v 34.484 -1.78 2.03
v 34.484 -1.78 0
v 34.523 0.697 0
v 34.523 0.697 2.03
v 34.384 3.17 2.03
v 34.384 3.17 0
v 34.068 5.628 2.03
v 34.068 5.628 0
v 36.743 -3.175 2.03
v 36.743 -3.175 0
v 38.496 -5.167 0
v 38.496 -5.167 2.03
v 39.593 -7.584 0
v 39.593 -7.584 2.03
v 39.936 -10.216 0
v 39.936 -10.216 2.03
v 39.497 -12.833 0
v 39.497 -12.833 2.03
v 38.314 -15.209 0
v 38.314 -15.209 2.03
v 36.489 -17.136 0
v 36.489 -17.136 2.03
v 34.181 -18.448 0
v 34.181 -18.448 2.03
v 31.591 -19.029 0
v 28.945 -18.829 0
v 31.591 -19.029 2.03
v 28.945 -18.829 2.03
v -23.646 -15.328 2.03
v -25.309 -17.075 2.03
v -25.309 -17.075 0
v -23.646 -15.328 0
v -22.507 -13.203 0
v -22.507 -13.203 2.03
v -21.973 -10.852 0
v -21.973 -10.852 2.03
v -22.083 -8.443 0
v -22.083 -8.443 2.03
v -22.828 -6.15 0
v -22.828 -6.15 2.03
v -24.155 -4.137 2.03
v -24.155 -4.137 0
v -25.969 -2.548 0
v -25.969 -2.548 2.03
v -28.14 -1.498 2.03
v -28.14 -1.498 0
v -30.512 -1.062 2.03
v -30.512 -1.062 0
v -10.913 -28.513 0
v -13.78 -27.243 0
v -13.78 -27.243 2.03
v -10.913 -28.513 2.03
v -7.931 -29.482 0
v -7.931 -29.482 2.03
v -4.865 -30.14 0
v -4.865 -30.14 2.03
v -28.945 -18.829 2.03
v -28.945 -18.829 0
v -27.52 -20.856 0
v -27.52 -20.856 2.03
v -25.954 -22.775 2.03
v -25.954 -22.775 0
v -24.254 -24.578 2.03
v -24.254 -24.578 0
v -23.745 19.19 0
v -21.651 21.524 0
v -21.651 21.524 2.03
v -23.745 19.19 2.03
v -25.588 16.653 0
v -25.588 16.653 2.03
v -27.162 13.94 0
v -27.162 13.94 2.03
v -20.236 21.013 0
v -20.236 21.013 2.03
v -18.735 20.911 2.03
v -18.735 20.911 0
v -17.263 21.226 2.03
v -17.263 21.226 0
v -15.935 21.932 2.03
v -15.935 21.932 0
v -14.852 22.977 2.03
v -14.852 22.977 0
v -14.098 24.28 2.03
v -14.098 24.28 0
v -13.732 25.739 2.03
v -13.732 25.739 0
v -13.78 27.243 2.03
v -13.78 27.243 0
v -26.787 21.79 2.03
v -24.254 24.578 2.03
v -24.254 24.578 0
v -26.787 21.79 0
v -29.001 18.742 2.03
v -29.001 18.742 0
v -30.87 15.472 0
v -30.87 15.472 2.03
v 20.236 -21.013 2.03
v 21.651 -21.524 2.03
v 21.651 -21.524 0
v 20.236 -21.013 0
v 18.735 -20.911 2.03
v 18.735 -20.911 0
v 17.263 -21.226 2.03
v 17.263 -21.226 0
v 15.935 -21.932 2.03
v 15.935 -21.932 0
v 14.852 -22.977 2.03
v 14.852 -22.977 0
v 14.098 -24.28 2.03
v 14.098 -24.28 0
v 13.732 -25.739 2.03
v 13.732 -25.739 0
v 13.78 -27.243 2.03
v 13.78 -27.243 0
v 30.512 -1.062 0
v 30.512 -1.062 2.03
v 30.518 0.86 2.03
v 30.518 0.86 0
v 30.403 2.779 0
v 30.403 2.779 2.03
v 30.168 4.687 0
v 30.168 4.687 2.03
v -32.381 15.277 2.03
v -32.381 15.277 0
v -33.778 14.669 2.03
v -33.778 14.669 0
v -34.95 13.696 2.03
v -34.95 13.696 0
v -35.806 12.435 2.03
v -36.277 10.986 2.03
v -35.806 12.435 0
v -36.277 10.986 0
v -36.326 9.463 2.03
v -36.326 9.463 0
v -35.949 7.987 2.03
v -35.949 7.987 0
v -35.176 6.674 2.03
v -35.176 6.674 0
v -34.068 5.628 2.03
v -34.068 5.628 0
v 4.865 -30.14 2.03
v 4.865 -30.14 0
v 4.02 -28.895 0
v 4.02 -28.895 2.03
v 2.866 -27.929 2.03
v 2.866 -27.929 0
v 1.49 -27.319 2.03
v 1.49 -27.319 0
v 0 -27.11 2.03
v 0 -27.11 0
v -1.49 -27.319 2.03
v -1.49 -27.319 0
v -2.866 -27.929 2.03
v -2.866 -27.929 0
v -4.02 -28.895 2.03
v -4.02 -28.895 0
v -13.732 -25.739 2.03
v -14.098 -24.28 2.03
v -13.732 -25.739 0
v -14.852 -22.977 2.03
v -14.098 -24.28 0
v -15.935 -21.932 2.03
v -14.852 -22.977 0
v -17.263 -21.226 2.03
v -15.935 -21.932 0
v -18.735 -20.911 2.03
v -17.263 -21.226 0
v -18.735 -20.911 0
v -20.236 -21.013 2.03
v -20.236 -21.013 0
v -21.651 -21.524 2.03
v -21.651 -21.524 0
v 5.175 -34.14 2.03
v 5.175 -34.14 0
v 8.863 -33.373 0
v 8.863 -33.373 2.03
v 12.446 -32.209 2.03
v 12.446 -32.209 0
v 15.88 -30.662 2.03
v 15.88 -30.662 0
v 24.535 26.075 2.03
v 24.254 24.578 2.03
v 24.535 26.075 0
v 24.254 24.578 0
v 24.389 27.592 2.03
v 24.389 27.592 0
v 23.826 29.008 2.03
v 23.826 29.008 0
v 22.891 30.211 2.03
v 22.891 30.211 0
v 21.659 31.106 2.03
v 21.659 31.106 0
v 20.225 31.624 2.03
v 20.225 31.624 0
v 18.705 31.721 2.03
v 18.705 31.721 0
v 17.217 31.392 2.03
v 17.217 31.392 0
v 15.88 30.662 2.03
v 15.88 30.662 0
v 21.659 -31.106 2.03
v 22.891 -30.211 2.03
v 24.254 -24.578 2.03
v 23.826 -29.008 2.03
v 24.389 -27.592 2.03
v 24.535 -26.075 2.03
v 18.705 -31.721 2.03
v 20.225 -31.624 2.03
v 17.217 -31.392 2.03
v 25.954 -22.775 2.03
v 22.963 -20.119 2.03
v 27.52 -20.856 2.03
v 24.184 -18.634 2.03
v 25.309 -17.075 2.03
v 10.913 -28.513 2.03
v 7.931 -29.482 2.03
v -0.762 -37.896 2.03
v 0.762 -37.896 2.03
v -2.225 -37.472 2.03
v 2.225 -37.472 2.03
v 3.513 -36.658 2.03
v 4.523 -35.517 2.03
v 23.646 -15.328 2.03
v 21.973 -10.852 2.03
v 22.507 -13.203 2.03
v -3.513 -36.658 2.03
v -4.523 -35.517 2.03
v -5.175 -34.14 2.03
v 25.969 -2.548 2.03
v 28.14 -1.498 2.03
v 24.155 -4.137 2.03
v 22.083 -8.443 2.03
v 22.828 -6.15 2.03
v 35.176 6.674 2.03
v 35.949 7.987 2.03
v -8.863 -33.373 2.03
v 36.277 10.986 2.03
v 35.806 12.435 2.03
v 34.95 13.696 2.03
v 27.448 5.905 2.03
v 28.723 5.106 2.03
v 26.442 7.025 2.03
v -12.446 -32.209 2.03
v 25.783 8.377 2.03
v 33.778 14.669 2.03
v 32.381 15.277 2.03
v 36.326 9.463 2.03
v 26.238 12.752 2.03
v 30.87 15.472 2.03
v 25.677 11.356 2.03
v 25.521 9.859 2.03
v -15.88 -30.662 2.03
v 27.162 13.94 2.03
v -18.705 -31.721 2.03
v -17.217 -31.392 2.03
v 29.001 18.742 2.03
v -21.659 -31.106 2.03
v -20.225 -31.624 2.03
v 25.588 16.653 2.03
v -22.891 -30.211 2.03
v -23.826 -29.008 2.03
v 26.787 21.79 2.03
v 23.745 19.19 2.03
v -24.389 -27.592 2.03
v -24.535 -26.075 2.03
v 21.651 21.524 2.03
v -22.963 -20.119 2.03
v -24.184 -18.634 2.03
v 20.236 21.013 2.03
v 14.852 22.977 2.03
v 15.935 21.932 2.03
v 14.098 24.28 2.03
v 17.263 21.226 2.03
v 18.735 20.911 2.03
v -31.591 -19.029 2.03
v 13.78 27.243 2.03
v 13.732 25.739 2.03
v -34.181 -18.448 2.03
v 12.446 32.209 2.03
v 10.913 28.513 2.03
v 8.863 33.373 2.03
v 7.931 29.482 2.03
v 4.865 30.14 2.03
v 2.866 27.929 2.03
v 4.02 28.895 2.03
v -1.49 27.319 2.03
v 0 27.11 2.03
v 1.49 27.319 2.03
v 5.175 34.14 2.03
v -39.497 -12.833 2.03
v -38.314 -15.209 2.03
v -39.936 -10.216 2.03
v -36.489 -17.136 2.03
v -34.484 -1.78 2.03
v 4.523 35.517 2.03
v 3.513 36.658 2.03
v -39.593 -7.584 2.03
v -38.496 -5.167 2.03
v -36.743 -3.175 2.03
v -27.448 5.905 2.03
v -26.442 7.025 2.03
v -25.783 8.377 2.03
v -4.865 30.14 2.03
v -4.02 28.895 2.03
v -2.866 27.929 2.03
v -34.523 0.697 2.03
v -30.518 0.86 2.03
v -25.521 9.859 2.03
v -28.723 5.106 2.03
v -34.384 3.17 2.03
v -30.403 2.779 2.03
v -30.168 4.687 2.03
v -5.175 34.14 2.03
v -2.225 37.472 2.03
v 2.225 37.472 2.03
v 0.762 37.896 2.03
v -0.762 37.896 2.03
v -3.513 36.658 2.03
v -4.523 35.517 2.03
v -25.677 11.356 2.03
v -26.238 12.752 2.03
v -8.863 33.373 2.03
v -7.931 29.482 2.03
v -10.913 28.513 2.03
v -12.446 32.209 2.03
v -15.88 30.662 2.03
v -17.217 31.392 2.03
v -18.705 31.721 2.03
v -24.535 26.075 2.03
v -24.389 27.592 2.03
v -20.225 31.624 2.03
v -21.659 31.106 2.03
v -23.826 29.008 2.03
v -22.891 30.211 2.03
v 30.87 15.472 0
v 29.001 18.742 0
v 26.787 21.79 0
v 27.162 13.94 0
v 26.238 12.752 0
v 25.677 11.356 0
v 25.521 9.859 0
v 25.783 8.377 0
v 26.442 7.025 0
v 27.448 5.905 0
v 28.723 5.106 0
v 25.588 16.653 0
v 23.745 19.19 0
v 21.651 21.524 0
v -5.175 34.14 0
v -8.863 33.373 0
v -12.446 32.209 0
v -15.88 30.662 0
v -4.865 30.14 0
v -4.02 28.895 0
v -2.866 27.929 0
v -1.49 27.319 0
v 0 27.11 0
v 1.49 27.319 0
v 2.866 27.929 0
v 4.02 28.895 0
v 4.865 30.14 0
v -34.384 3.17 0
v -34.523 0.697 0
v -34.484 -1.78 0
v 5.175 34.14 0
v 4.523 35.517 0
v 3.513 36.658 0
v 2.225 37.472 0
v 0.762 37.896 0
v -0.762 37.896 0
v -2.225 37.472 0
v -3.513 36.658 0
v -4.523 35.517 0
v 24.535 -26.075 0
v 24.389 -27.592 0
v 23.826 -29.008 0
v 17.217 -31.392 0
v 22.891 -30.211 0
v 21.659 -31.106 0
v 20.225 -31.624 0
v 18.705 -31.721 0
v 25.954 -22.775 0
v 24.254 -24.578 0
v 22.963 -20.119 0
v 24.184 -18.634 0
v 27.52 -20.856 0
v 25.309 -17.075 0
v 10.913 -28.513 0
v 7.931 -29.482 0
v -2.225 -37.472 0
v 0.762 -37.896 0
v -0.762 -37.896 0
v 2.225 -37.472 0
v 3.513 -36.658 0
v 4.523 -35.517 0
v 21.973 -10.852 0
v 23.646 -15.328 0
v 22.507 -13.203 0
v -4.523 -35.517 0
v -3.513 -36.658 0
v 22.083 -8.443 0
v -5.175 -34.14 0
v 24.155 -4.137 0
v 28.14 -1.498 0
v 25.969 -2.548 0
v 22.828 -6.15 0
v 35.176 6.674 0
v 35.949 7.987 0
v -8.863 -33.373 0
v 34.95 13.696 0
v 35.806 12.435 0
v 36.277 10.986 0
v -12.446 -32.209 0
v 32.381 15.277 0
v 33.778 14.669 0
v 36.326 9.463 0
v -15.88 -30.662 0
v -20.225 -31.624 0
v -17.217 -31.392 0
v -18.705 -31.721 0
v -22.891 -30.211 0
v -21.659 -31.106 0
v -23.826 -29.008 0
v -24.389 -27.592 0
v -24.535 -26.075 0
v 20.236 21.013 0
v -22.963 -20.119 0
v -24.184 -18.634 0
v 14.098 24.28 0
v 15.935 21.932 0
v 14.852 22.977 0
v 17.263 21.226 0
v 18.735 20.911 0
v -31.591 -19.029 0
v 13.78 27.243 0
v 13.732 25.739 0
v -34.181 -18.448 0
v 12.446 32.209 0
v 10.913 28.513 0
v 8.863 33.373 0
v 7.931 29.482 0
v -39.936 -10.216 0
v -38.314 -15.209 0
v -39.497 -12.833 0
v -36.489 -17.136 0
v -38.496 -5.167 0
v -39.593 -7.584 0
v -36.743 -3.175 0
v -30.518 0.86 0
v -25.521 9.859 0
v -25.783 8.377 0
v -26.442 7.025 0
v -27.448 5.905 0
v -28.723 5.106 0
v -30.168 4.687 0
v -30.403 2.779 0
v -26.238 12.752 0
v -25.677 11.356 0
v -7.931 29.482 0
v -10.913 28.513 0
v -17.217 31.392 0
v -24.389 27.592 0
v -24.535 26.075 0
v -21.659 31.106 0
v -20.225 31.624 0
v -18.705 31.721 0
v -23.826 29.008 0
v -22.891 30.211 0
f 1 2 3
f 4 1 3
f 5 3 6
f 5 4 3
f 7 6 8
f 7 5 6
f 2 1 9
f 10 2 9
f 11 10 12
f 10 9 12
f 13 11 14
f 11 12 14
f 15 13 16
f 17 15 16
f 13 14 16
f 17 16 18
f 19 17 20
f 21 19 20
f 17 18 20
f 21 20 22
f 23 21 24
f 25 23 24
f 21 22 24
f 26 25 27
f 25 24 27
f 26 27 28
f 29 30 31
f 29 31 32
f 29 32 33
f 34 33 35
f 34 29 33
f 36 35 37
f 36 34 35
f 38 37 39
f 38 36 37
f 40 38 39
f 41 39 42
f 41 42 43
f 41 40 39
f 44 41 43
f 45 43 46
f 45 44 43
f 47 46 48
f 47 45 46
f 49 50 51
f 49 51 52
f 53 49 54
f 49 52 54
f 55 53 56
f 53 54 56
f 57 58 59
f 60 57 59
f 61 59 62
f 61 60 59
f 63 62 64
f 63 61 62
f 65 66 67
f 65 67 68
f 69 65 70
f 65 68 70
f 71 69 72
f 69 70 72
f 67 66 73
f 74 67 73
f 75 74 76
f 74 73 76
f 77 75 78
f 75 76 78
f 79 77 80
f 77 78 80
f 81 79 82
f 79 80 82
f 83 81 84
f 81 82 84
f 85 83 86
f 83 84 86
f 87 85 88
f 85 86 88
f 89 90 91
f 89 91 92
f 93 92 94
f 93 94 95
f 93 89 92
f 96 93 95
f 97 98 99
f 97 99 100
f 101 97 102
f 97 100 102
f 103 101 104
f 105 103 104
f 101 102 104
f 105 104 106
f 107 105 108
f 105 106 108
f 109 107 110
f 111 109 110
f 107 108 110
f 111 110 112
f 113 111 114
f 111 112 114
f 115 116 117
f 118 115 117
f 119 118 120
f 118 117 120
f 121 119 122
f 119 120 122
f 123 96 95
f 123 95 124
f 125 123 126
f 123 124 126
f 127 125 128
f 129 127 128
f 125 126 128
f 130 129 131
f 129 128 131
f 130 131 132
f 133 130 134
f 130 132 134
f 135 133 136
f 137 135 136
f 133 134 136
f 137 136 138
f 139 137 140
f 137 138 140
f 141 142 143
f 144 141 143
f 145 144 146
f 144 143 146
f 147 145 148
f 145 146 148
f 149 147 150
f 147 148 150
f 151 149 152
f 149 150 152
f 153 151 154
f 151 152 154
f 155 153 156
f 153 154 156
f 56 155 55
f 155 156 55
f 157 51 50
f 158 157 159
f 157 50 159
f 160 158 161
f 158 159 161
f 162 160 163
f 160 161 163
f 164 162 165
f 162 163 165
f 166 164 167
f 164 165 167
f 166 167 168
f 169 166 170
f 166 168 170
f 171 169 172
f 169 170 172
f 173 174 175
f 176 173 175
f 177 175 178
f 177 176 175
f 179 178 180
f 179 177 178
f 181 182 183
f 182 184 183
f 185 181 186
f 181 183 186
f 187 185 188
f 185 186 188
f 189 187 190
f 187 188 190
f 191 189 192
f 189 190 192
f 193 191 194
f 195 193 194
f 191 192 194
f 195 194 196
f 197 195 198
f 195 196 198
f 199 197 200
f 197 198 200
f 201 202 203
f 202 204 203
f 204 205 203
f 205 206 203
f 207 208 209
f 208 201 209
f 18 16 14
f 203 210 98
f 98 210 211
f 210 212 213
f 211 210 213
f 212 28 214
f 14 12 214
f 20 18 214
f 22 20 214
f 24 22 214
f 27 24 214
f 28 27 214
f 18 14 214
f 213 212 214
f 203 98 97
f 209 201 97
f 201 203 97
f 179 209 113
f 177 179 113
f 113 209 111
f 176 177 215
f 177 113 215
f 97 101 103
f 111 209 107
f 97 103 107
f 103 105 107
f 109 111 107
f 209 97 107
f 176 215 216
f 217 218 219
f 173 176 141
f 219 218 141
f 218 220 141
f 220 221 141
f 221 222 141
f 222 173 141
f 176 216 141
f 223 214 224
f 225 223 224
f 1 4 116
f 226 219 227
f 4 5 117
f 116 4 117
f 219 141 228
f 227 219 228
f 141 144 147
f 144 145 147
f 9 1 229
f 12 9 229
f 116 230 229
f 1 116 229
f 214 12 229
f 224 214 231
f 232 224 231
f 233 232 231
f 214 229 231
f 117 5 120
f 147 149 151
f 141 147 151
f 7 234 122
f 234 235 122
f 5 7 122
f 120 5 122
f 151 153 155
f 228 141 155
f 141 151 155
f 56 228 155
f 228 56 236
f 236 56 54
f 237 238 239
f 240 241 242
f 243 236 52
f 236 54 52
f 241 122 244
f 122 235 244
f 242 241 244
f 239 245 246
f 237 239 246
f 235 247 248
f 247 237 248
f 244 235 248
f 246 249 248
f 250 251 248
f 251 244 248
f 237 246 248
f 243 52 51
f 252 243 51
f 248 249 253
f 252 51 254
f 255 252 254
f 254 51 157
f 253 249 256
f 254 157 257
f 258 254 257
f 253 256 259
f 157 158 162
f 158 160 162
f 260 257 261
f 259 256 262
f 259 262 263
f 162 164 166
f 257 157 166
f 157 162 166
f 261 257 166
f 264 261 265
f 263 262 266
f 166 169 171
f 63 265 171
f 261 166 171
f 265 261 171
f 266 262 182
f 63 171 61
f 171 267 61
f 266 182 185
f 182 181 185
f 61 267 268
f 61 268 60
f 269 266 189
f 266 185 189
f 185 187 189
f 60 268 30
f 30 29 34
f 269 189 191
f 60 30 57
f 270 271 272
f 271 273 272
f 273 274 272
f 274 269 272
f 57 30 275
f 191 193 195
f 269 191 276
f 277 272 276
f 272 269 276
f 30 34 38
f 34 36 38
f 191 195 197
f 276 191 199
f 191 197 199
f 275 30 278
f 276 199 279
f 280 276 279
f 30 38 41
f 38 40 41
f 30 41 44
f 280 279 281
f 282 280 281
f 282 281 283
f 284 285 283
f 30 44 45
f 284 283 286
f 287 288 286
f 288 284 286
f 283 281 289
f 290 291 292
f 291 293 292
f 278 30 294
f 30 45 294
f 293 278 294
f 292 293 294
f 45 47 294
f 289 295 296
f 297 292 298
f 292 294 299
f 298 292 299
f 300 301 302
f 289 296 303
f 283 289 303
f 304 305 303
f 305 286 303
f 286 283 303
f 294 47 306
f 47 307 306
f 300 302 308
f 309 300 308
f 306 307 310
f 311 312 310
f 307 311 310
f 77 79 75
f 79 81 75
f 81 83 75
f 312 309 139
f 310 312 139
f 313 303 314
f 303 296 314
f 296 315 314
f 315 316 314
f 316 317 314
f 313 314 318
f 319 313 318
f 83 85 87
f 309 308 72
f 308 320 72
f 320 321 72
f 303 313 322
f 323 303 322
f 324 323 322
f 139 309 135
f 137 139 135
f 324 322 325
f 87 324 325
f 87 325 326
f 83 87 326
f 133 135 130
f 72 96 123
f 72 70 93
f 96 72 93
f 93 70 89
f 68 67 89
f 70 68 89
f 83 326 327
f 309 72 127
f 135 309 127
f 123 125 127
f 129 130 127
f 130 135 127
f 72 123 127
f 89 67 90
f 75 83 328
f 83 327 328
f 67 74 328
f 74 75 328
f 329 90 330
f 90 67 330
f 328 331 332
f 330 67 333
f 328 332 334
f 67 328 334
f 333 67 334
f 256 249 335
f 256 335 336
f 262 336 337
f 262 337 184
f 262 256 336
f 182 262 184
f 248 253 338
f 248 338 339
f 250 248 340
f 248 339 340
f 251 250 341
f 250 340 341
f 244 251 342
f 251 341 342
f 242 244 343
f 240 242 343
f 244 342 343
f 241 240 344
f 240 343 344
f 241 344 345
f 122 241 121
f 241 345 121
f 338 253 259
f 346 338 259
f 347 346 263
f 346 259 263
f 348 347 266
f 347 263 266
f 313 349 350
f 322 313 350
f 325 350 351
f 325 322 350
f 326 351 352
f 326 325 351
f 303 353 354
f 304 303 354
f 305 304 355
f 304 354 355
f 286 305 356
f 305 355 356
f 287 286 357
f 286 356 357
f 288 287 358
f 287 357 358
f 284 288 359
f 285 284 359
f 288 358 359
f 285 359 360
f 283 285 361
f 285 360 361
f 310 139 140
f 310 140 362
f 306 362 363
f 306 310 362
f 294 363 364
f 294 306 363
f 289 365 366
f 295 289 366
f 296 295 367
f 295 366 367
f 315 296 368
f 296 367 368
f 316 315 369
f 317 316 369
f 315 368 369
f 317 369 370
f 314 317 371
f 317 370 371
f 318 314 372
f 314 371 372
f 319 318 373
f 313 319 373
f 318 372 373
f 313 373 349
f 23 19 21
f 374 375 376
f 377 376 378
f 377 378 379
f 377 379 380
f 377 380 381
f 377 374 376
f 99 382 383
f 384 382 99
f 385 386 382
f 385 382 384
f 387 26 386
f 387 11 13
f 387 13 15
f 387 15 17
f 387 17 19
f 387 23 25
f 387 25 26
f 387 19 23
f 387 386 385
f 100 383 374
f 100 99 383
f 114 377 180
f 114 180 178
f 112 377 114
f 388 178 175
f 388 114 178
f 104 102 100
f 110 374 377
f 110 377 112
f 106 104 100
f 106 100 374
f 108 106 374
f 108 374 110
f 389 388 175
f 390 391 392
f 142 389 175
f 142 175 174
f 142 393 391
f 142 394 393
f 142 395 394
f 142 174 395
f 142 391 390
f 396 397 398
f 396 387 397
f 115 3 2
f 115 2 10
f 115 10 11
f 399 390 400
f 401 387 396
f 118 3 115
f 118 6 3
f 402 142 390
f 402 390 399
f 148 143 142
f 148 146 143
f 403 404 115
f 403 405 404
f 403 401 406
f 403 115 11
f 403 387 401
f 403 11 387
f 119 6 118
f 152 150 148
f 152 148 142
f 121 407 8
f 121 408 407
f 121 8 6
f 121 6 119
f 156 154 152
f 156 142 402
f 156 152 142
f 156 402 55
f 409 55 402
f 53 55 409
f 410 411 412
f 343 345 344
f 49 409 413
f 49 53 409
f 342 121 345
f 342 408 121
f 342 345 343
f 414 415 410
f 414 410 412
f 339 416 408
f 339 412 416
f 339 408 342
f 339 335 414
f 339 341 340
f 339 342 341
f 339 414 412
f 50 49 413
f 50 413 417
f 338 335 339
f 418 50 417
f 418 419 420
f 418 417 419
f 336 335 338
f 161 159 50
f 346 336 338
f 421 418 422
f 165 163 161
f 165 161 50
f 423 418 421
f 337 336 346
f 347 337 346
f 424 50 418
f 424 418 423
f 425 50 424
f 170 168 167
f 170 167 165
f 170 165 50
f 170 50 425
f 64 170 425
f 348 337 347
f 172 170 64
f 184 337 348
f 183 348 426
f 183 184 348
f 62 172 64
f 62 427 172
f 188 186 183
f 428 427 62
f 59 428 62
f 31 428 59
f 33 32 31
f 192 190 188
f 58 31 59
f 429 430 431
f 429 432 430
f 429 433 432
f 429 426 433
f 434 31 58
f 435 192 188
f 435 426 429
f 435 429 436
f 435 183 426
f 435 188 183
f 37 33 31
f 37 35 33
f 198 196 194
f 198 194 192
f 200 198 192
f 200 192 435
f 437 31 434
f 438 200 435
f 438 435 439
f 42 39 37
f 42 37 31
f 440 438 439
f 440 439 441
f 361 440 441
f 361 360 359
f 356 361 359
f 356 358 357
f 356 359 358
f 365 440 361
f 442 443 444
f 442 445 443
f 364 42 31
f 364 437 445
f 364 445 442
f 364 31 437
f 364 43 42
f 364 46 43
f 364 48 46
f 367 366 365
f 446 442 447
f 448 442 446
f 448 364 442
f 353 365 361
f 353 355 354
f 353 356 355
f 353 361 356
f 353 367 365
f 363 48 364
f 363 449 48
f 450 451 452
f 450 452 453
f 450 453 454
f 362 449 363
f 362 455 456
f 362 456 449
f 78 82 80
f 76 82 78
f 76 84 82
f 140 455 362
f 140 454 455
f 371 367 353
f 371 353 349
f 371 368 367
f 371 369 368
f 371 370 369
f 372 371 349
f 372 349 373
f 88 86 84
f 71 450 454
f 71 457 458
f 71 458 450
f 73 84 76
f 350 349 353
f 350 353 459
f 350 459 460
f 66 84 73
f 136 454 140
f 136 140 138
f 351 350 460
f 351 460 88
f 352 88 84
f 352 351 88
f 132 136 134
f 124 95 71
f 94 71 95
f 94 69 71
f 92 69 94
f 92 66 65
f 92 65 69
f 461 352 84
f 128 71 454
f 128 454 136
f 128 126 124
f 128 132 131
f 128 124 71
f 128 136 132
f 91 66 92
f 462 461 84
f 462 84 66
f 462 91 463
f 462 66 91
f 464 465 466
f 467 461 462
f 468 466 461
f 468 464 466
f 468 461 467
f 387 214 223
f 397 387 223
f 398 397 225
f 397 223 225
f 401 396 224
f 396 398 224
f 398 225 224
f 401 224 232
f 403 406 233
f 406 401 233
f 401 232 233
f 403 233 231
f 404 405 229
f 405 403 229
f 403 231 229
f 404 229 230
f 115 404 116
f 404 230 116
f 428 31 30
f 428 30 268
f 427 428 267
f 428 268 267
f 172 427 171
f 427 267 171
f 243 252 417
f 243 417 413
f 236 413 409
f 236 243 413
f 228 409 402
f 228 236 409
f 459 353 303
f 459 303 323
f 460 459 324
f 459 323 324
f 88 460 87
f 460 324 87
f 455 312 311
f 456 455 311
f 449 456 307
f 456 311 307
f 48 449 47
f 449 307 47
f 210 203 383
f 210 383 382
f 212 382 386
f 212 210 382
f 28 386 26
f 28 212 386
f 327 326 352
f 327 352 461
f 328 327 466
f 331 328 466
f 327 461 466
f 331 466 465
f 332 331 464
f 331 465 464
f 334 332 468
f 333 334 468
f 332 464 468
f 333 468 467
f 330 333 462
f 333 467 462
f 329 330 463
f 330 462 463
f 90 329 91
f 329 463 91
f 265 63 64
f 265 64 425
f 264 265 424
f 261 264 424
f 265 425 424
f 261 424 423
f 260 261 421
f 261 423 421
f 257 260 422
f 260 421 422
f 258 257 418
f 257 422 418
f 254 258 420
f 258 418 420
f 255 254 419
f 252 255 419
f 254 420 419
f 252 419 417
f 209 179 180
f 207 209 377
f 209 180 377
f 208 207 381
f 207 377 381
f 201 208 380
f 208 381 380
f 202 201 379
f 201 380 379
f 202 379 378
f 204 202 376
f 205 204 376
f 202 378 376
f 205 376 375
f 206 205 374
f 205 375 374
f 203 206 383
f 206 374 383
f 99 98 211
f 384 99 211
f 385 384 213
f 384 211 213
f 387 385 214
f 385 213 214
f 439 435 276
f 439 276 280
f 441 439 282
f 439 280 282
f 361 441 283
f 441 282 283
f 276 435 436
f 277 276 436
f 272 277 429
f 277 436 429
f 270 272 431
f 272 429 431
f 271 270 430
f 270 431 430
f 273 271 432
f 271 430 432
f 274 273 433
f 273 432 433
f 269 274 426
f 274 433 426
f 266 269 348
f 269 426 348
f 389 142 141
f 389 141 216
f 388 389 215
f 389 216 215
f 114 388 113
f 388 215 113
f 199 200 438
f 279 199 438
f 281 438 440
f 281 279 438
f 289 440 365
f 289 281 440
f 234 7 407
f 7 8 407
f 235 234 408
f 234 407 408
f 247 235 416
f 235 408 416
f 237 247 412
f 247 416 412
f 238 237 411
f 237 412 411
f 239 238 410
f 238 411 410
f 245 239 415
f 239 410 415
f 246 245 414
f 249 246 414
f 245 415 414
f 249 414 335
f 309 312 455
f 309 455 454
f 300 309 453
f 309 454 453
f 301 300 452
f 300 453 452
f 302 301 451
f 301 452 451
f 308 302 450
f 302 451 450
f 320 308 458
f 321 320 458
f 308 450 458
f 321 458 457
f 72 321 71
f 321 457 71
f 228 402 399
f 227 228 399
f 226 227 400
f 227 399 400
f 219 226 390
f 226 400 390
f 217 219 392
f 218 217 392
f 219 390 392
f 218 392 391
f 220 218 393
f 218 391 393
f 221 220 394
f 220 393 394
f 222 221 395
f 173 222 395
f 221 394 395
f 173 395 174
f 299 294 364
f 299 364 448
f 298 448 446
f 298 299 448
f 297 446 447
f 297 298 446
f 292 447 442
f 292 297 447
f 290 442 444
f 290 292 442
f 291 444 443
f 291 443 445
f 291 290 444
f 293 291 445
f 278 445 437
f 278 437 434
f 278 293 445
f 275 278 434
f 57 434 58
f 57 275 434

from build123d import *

# Parameters (mm, degrees)
SKETCH1_R              = 5.42
BOSS_EXTRUDE1_DEPTH    = 2.03
BOSS_EXTRUDE1_2_DEPTH  = 2.03
BOSS_EXTRUDE1_3_DEPTH  = 2.03
BOSS_EXTRUDE1_4_DEPTH  = 2.03
BOSS_EXTRUDE1_5_DEPTH  = 2.03
BOSS_EXTRUDE1_6_DEPTH  = 2.03
BOSS_EXTRUDE1_7_DEPTH  = 2.03
BOSS_EXTRUDE1_8_DEPTH  = 2.03
BOSS_EXTRUDE1_9_DEPTH  = 2.03
BOSS_EXTRUDE1_10_DEPTH = 2.03
SKETCH2_R              = 34.53
SKETCH2_R_2            = 30.53
BOSS_EXTRUDE2_DEPTH    = 2.03
SKETCH3_R              = 9
BOSS_EXTRUDE3_DEPTH    = 2.03


with BuildPart() as part:
    # Sketch1 → Boss-Extrude1 (new body)
    with BuildSketch(Plane.XY):
        with Locations((0, -32.53)):
            Circle(SKETCH1_R)
    extrude(amount=BOSS_EXTRUDE1_DEPTH)



with BuildPart() as body_2:
    # Sketch1 → Boss-Extrude1 2 (new body)
    with BuildSketch(Plane.XY):
        with Locations((-19.120654257, -26.317322827)):
            Circle(SKETCH1_R)
    extrude(amount=BOSS_EXTRUDE1_2_DEPTH)


with BuildPart() as body_3:
    # Sketch1 → Boss-Extrude1 3 (new body)
    with BuildSketch(Plane.XY):
        with Locations((-30.937868475, -10.052322827)):
            Circle(SKETCH1_R)
    extrude(amount=BOSS_EXTRUDE1_3_DEPTH)


with BuildPart() as body_4:
    # Sketch1 → Boss-Extrude1 4 (new body)
    with BuildSketch(Plane.XY):
        with Locations((-30.937868475, 10.052322827)):
            Circle(SKETCH1_R)
    extrude(amount=BOSS_EXTRUDE1_4_DEPTH)


with BuildPart() as body_5:
    # Sketch1 → Boss-Extrude1 5 (new body)
    with BuildSketch(Plane.XY):
        with Locations((-19.120654257, 26.317322827)):
            Circle(SKETCH1_R)
    extrude(amount=BOSS_EXTRUDE1_5_DEPTH)


with BuildPart() as body_6:
    # Sketch1 → Boss-Extrude1 6 (new body)
    with BuildSketch(Plane.XY):
        with Locations((0, 32.53)):
            Circle(SKETCH1_R)
    extrude(amount=BOSS_EXTRUDE1_6_DEPTH)


with BuildPart() as body_7:
    # Sketch1 → Boss-Extrude1 7 (new body)
    with BuildSketch(Plane.XY):
        with Locations((19.120654257, 26.317322827)):
            Circle(SKETCH1_R)
    extrude(amount=BOSS_EXTRUDE1_7_DEPTH)


with BuildPart() as body_8:
    # Sketch1 → Boss-Extrude1 8 (new body)
    with BuildSketch(Plane.XY):
        with Locations((30.937868475, 10.052322827)):
            Circle(SKETCH1_R)
    extrude(amount=BOSS_EXTRUDE1_8_DEPTH)


with BuildPart() as body_9:
    # Sketch1 → Boss-Extrude1 9 (new body)
    with BuildSketch(Plane.XY):
        with Locations((30.937868475, -10.052322827)):
            Circle(SKETCH1_R)
    extrude(amount=BOSS_EXTRUDE1_9_DEPTH)


with BuildPart() as body_10:
    # Sketch1 → Boss-Extrude1 10 (new body)
    with BuildSketch(Plane.XY):
        with Locations((19.120654257, -26.317322827)):
            Circle(SKETCH1_R)
    extrude(amount=BOSS_EXTRUDE1_10_DEPTH)


with BuildPart() as part_1:
    add(part.part)

    add(body_2.part)  # Boss-Extrude2 merges body 2

    add(body_3.part)  # Boss-Extrude2 merges body 3

    add(body_4.part)  # Boss-Extrude2 merges body 4

    add(body_5.part)  # Boss-Extrude2 merges body 5

    add(body_6.part)  # Boss-Extrude2 merges body 6

    add(body_7.part)  # Boss-Extrude2 merges body 7

    add(body_8.part)  # Boss-Extrude2 merges body 8

    add(body_9.part)  # Boss-Extrude2 merges body 9

    add(body_10.part)  # Boss-Extrude2 merges body 10
    # Sketch2 → Boss-Extrude2 (add)
    with BuildSketch(Plane.XY.offset(2.03)):
        Circle(SKETCH2_R)
        Circle(SKETCH2_R_2, mode=Mode.SUBTRACT)
    extrude(amount=-BOSS_EXTRUDE2_DEPTH)

    # Sketch3 → Boss-Extrude3 (add)
    with BuildSketch(Plane.XY.offset(2.03)):
        with Locations((-30.937868475, -10.052322827)):
            Circle(SKETCH3_R)
    boss_extrude3 = extrude(amount=-BOSS_EXTRUDE3_DEPTH)

    # Mirror1: Boss-Extrude3 across plane
    add(boss_extrude3.mirror(Plane(origin=(0, 0, 0), x_dir=(0, 0, 1), z_dir=(1, 0, 0))))


solid = part_1.part
